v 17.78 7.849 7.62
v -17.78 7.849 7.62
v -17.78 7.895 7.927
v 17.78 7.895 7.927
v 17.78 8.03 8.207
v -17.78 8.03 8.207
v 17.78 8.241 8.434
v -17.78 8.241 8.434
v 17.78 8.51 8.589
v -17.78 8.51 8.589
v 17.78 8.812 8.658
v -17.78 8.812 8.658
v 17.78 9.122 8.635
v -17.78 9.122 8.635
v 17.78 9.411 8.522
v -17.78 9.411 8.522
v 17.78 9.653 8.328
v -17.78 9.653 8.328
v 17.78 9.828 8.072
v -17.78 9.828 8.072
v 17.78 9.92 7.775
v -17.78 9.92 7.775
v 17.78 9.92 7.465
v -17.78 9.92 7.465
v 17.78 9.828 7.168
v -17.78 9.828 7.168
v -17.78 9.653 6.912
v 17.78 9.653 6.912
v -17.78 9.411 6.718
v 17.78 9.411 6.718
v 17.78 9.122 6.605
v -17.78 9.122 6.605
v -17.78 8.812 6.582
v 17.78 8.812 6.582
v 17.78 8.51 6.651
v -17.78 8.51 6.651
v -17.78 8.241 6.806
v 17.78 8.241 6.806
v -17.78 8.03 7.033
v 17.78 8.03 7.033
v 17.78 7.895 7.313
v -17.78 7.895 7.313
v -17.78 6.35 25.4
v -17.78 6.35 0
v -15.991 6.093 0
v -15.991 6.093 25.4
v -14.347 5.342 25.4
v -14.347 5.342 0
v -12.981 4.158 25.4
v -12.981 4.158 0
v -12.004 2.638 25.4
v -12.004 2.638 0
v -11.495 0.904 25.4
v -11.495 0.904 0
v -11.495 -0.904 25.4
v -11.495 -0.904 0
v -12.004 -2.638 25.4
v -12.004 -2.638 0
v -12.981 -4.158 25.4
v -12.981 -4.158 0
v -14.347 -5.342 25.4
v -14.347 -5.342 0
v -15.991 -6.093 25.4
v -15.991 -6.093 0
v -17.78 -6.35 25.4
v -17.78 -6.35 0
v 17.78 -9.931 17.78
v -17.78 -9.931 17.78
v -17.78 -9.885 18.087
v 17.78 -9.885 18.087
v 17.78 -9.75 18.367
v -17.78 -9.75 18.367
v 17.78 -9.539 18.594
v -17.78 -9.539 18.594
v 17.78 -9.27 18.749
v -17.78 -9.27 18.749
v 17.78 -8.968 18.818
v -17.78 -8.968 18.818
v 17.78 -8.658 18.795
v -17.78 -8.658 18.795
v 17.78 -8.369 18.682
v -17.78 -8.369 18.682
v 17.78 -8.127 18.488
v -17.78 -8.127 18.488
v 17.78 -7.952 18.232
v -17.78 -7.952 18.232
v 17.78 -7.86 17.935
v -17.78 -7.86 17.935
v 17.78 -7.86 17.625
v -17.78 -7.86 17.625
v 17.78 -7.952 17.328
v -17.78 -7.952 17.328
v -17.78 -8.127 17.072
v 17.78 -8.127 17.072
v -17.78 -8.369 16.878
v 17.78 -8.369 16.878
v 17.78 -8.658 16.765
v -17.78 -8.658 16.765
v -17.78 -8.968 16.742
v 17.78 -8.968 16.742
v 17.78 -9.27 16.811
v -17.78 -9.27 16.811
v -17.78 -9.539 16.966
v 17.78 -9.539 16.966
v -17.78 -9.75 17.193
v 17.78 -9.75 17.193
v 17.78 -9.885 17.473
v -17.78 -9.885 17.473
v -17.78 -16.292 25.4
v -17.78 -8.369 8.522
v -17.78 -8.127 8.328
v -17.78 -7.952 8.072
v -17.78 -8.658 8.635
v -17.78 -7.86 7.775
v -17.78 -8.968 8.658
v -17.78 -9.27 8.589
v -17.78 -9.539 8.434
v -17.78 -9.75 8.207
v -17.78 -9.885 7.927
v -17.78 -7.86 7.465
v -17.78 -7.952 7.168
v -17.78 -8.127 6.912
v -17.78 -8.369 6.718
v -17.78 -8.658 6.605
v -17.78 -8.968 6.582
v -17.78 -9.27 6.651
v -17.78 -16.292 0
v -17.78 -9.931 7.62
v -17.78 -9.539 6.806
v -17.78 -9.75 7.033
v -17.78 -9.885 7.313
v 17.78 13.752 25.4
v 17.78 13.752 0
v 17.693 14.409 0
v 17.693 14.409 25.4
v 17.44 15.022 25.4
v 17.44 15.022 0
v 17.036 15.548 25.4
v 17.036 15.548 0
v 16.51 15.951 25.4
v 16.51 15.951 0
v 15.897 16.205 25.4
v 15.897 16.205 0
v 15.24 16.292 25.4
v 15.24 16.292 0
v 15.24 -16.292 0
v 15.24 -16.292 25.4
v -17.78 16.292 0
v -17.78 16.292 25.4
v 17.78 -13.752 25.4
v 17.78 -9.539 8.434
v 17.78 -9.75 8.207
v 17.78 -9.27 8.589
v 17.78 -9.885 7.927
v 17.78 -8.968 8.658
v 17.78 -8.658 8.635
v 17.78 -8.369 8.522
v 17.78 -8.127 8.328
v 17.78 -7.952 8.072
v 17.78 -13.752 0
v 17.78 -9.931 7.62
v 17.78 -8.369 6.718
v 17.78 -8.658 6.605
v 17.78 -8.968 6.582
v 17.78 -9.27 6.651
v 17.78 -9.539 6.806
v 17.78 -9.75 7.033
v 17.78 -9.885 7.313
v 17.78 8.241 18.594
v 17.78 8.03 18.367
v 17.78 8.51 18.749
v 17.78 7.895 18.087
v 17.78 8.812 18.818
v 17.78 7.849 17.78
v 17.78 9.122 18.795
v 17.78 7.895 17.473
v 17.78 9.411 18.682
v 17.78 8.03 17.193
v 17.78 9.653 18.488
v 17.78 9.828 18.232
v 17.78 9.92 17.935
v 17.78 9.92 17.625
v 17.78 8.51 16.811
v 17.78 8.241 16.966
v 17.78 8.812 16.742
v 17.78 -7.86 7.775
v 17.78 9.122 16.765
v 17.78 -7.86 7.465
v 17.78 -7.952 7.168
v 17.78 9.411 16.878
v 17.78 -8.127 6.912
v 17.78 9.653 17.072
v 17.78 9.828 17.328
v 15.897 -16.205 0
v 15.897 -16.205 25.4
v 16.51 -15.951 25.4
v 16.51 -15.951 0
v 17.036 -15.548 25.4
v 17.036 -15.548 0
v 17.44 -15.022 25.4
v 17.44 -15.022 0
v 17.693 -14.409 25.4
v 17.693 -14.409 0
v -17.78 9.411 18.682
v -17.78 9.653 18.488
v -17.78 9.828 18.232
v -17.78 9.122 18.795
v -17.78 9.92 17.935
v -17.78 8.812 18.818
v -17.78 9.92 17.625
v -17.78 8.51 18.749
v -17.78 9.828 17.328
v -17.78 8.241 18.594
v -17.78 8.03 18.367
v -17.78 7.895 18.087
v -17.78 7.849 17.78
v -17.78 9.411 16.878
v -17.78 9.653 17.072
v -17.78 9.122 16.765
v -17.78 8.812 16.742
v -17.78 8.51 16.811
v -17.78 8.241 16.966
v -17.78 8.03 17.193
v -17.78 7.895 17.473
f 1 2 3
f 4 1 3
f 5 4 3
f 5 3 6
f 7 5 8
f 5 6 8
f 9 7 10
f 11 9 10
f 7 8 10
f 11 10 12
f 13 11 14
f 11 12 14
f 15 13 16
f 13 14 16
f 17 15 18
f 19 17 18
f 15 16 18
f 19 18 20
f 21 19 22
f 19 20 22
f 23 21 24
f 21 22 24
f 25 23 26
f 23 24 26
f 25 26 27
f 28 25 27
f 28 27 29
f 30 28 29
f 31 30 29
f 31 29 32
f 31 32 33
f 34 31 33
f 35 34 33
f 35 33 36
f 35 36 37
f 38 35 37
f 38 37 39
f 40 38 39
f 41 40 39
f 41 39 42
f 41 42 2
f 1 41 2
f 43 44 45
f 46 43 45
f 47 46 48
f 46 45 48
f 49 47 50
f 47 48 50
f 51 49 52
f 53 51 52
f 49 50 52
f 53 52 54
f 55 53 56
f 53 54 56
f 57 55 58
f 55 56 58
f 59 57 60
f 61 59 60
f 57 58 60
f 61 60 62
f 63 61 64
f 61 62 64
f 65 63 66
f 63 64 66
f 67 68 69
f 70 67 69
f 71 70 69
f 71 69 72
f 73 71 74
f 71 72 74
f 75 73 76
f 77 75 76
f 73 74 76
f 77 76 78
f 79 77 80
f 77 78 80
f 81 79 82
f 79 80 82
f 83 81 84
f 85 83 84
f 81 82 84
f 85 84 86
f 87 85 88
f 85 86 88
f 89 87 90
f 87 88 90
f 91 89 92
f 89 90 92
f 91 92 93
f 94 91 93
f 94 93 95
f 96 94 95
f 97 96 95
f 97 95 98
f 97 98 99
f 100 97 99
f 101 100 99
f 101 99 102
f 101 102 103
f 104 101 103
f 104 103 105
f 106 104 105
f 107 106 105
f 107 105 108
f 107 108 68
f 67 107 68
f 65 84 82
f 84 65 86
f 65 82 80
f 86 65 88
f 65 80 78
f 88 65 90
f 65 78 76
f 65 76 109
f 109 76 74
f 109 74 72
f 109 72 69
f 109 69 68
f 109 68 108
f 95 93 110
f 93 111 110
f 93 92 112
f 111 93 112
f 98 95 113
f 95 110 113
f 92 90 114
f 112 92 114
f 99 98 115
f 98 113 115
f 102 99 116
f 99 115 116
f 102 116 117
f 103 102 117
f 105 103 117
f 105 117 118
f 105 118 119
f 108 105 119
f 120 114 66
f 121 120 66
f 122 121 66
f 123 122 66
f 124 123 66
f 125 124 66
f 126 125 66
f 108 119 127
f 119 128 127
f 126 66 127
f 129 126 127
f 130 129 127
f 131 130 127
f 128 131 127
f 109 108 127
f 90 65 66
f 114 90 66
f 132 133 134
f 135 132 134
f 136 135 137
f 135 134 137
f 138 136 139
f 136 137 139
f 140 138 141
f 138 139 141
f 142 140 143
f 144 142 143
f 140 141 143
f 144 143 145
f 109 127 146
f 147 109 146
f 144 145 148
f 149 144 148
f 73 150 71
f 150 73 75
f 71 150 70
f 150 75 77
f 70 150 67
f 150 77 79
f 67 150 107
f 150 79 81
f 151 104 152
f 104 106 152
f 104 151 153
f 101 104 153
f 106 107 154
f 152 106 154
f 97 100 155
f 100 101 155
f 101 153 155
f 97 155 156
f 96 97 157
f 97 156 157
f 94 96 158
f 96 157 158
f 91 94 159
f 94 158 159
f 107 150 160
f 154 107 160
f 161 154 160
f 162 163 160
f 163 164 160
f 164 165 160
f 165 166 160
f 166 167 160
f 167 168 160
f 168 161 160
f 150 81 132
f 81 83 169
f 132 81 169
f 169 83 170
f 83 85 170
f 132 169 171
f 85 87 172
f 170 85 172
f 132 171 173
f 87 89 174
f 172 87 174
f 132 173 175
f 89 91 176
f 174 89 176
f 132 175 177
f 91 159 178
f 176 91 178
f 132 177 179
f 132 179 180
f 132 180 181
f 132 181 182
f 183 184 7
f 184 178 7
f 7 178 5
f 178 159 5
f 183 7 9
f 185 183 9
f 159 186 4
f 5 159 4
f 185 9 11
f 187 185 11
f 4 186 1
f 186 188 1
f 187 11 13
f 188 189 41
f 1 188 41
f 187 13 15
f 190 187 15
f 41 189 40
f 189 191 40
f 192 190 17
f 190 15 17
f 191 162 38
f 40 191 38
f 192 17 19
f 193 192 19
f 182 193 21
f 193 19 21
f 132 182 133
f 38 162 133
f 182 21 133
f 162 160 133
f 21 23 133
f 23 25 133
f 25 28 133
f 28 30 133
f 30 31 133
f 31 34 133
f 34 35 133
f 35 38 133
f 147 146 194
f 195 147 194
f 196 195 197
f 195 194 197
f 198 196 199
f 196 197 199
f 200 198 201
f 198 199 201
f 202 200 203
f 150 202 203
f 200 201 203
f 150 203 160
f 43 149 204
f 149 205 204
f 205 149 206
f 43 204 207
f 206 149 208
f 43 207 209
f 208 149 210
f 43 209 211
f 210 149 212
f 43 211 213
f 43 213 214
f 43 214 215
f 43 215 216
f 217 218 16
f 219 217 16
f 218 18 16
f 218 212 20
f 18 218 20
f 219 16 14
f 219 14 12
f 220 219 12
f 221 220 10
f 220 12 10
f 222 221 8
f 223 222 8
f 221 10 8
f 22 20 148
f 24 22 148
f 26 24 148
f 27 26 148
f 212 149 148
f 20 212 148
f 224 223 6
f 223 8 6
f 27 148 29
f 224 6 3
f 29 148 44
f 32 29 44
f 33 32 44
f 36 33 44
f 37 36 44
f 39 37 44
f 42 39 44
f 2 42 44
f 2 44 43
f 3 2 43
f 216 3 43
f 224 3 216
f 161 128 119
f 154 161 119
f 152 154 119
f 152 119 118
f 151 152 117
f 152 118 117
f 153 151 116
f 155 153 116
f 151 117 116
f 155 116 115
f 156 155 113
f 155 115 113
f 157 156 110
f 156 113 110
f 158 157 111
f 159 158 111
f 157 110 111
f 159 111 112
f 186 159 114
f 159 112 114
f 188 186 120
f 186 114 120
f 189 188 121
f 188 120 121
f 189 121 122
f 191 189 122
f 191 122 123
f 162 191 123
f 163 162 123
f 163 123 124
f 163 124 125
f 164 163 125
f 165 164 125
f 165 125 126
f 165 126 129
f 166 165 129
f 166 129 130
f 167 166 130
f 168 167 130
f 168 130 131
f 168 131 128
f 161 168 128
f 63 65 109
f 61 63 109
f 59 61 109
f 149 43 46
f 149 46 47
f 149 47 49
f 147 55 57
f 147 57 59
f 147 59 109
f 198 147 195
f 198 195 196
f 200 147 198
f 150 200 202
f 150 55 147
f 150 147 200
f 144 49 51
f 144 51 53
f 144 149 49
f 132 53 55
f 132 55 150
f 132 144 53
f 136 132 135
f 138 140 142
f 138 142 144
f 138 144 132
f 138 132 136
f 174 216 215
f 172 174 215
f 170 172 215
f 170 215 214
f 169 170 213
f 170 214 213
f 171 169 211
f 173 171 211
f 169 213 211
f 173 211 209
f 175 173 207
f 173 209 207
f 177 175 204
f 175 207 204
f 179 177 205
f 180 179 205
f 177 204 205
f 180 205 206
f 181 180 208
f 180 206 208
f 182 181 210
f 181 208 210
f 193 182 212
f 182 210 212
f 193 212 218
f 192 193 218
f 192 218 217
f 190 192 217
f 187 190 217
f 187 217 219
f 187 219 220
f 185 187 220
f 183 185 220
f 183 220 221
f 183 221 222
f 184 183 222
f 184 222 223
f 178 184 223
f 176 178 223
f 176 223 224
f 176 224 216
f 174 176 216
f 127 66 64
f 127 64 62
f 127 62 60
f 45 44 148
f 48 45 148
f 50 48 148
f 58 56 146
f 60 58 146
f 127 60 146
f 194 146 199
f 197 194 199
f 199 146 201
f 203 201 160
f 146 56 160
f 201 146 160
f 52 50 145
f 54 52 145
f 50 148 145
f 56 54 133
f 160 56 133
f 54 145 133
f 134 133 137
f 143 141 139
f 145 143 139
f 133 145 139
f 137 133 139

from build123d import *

# Parameters (mm, degrees)
F1_DEPTH = 25.4
F3_D     = 2.0828


# Not quite as in the source:
# - a feature names something its author has since deleted; it is built from what else it names


with BuildPart() as f1:
    # F0 (on Top) → F1 (new body)
    with BuildSketch(Plane.XY):
        with BuildLine():
            Line((-17.78, -6.35), (-17.78, -16.29156))
            Line((-17.78, -16.29156), (15.24, -16.29156))
            ThreePointArc((15.24, -16.29156), (17.0360512242, -15.5476112242), (17.78, -13.75156))
            Line((17.78, -13.75156), (17.78, 13.75156))
            ThreePointArc((17.78, 13.75156), (17.0360512242, 15.5476112242), (15.24, 16.29156))
            Line((15.24, 16.29156), (-17.78, 16.29156))
            Line((-17.78, 16.29156), (-17.78, 6.35))
            ThreePointArc((-17.78, 6.35), (-11.43, 0), (-17.78, -6.35))
        make_face()
    extrude(amount=F1_DEPTH)

    # F3 (through all)
    with Locations(Plane.YZ.offset(17.78)):
        with Locations((-8.89, 17.78), (-8.89, 7.62), (8.89, 17.78), (8.89, 7.62)):
            Hole(F3_D / 2)


solid = f1.part
